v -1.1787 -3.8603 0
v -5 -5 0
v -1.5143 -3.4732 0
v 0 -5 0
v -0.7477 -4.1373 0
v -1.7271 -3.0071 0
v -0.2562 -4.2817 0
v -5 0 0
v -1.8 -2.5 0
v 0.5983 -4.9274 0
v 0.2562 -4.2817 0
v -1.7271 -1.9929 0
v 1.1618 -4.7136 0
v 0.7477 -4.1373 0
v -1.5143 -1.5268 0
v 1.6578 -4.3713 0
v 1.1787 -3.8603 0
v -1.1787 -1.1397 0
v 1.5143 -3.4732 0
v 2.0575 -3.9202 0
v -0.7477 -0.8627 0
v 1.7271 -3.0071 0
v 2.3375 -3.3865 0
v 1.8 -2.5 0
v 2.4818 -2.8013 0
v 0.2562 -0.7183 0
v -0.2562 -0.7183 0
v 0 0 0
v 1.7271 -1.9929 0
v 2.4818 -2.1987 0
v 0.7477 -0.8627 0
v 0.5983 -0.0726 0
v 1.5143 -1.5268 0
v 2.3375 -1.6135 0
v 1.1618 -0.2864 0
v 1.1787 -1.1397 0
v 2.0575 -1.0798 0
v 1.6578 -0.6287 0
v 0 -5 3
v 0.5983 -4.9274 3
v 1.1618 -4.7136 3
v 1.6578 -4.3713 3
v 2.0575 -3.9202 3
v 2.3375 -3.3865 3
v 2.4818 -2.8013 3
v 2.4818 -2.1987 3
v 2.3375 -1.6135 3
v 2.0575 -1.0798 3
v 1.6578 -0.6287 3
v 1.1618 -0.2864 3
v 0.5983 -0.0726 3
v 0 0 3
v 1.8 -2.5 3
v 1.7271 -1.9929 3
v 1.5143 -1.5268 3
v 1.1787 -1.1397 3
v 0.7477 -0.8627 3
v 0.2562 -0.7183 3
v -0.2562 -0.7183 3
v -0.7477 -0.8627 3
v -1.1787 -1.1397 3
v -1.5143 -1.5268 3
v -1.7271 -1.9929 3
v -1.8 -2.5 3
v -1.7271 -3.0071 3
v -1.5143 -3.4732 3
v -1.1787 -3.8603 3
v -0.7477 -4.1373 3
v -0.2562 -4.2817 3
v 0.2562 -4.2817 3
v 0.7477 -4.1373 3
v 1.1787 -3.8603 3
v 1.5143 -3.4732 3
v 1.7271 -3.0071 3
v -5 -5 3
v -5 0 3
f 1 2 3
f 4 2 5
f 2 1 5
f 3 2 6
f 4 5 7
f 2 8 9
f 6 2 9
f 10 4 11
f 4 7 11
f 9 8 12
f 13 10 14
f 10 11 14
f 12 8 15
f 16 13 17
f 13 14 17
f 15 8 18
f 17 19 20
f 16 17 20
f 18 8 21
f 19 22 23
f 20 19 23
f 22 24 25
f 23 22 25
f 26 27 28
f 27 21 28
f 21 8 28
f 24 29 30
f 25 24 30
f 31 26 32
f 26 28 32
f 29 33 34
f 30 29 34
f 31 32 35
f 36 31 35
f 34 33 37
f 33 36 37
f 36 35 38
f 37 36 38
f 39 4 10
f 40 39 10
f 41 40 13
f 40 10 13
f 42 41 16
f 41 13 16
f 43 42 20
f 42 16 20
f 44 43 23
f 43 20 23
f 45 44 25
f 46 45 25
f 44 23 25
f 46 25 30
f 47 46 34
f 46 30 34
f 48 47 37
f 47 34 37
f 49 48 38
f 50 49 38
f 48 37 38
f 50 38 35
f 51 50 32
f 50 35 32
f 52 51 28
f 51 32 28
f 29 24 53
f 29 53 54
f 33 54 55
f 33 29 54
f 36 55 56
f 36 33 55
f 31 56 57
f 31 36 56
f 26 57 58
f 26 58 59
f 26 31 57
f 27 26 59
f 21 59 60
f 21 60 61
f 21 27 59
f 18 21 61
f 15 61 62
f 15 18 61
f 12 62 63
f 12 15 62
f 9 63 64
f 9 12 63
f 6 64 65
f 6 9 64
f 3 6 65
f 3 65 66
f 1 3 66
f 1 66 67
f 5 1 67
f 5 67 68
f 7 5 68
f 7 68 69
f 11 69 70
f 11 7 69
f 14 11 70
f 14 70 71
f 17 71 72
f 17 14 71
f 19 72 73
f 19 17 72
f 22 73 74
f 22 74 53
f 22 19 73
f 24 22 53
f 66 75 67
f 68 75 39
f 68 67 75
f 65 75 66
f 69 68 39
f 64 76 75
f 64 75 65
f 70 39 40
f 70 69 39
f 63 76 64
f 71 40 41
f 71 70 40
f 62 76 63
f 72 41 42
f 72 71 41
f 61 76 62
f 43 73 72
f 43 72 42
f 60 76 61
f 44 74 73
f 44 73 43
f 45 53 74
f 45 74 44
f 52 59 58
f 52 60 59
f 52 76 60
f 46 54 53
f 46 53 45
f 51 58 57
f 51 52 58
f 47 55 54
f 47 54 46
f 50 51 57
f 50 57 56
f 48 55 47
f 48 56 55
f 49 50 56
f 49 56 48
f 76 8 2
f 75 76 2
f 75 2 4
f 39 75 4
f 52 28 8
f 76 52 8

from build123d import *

# Parameters (mm, degrees)
SKETCH_2_R      = 1.8
EXTRUDE_1_DEPTH = 3


with BuildPart() as part:
    # 草图2 → 凸台-拉伸1 (new body)
    with BuildSketch(Plane.XY):
        with BuildLine():
            Line((0, 0), (-5, 0))
            Line((-5, 0), (-5, -5))
            Line((-5, -5), (0, -5))
            ThreePointArc((0, -5), (2.5, -2.5), (0, 0))
        make_face()
        with Locations((0, -2.5)):
            Circle(SKETCH_2_R, mode=Mode.SUBTRACT)
    extrude(amount=EXTRUDE_1_DEPTH)


solid = part.part
